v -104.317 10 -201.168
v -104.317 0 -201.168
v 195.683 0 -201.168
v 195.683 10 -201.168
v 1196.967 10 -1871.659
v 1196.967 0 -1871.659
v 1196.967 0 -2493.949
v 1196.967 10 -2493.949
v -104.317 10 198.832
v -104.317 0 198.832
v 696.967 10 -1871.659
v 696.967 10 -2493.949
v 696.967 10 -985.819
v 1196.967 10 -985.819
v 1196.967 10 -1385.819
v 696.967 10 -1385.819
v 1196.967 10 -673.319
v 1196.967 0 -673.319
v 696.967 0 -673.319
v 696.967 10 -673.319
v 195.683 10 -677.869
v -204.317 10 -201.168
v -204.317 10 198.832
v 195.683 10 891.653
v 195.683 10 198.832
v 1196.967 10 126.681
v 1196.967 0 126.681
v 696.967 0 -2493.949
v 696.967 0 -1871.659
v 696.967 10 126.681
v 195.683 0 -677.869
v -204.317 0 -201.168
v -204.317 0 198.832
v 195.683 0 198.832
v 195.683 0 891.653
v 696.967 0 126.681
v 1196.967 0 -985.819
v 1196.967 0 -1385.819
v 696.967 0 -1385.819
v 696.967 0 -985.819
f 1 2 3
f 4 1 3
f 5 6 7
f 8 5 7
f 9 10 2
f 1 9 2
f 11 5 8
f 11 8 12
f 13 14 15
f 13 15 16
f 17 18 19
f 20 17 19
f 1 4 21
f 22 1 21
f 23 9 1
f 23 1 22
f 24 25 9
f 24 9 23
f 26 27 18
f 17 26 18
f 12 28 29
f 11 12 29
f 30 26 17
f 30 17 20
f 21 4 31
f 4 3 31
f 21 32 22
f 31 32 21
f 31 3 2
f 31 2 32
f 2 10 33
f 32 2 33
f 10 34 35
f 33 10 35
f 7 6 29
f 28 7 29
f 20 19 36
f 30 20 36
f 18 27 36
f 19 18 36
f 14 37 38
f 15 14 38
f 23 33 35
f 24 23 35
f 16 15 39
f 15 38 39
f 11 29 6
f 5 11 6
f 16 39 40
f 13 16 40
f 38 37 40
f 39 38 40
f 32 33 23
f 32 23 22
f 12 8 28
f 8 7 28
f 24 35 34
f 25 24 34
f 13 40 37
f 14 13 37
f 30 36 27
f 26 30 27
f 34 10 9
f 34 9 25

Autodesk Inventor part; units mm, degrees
ref_plane "YZ Plane" through (0, 0, 0) normal (1, 0, 0) x (0, 1, 0)
ref_plane "XZ Plane" through (0, 0, 0) normal (0, 1, 0) x (-1, 0, 0)
ref_plane "XY Plane" through (0, 0, 0) normal (0, 0, 1) x (1, 0, 0)
sketch "草圖1" plane through (0, 0, 0) normal (0, 1, 0) x (-1, 0, 0)
  line L0 (104.3168, 198.8324) -> (-195.6832, 198.8324)
  line L1 (204.3168, 198.8324) -> (-195.6832, 891.6528)
  line L2 (-195.6832, 891.6528) -> (-195.6832, 198.8324)
  line L3 (204.3168, 198.8324) -> (204.3168, -201.1676)
  line L4 (104.3168, -201.1676) -> (-195.6832, -201.1676)
  line L5 (204.3168, -201.1676) -> (-195.6832, -677.869)
  line L6 (-195.6832, -201.1676) -> (-195.6832, -677.869)
  line L7 (104.3168, 198.8324) -> (104.3168, -201.1676)
  line L8 (-696.9674, 126.681) -> (-1196.9674, 126.681)
  line L9 (-1196.9674, 126.681) -> (-1196.9674, -673.319)
  line L10 (-1196.9674, -673.319) -> (-696.9674, -673.319)
  line L11 (-696.9674, -673.319) -> (-696.9674, 126.681)
  line L12 (-696.9674, 126.681) -> (-1196.9674, -673.319) construction
  line L13 (-1196.9674, 126.681) -> (-696.9674, -673.319) construction
  line L14 (-1196.9674, -1385.819) -> (-696.9674, -1385.819)
  line L15 (-696.9674, -1385.819) -> (-696.9674, -985.819)
  line L16 (-696.9674, -985.819) -> (-1196.9674, -985.819)
  line L17 (-1196.9674, -985.819) -> (-1196.9674, -1385.819)
  line L18 (-1196.9674, -1385.819) -> (-696.9674, -985.819) construction
  line L19 (-696.9674, -1385.819) -> (-1196.9674, -985.819) construction
  line L20 (-1196.9674, -2493.949) -> (-696.9674, -2493.949)
  line L21 (-696.9674, -2493.949) -> (-696.9674, -1871.659)
  line L22 (-696.9674, -1871.659) -> (-1196.9674, -1871.659)
  line L23 (-1196.9674, -1871.659) -> (-1196.9674, -2493.949)
  line L24 (-1196.9674, -2493.949) -> (-696.9674, -1871.659) construction
  line L25 (-696.9674, -2493.949) -> (-1196.9674, -1871.659) construction
  point P0 (-946.9674, -273.319)
  point P1 (-946.9674, -1185.819)
  point P2 (-946.9674, -2182.804)
  dimension "d3" = 30
  dimension "d6" = 400
  dimension "d8" = 400
  dimension "d10" = 100
  dimension "d11" = 40
  dimension "d12" = 800
  dimension "d13" = 622.2895
  dimension "d18" = 800
  dimension "d19" = 500
  dimension "d20" = 400
  dimension "d21" = 500
  dimension "d22" = 622.29
  dimension "d23" = 500
extrude "擠出1" add sketch "草圖1" along normal blind 10
